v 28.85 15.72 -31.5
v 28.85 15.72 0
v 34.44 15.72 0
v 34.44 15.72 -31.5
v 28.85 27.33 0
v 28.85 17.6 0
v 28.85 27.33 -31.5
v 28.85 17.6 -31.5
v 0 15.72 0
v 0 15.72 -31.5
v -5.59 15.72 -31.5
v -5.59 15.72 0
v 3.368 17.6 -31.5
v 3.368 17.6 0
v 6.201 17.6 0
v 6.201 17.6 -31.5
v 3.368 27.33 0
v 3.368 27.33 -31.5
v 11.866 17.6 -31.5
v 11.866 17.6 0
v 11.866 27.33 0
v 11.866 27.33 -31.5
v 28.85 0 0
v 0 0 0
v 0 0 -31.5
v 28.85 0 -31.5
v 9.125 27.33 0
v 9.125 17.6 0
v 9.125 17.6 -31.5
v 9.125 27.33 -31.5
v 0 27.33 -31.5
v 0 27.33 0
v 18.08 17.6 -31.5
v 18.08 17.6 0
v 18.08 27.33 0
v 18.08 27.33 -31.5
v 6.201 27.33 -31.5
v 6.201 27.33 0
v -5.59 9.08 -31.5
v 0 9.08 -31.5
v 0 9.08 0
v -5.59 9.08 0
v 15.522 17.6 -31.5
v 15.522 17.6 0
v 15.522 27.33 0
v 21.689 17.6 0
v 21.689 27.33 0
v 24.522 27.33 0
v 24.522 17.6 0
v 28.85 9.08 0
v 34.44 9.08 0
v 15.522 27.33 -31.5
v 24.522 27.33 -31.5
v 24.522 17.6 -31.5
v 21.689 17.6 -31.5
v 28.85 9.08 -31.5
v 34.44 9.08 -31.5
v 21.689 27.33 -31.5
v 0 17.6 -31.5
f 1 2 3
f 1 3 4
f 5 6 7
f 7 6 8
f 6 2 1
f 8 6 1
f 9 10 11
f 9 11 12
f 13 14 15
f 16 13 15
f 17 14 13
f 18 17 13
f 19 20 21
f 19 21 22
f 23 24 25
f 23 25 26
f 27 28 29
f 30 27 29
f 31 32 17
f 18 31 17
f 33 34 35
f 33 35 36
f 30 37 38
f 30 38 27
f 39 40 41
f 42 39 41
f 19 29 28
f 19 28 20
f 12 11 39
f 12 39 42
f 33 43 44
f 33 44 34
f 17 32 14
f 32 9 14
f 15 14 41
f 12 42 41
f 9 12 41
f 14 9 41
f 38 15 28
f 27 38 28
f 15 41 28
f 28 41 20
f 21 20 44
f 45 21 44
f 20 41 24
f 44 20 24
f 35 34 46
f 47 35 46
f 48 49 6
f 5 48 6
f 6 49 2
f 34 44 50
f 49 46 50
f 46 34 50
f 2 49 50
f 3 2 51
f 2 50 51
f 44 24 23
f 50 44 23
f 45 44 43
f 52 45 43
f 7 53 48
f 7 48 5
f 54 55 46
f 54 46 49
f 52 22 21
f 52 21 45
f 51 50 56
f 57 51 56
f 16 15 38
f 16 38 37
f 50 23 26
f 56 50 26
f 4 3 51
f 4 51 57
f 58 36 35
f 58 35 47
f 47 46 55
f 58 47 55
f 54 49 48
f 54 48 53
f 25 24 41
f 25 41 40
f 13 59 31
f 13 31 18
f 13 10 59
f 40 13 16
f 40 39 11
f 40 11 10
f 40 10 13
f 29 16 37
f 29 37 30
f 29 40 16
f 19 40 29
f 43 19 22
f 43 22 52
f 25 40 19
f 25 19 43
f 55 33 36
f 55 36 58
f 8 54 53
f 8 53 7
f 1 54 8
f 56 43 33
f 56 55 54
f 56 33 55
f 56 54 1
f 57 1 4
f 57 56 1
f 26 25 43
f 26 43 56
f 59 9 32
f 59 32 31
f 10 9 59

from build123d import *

# Parameters (mm, degrees)
CROQUIS1_W              = 28.85
CROQUIS1_H              = 31.5
SALIENTE_EXTRUIR1_DEPTH = 17.6
CROQUIS3_W              = 3.368460879
CROQUIS3_H              = 31.5
CROQUIS3_W_2            = 4.327912621
CROQUIS3_W_3            = 3.609366076
CROQUIS3_W_4            = 3.655054254
CROQUIS3_W_5            = 2.924043404
SALIENTE_EXTRUIR2_DEPTH = 9.73
CROQUIS4_W              = 31.5
CROQUIS4_H              = 6.64
SALIENTE_EXTRUIR3_DEPTH = 5.59
CROQUIS5_W              = 31.5
CROQUIS5_H              = 6.64
SALIENTE_EXTRUIR4_DEPTH = 5.59


with BuildPart() as part:
    # Croquis1 → Saliente-Extruir1 (new body)
    with BuildSketch(Plane(origin=(0, 0, 0), x_dir=(1, 0, 0), z_dir=(0, 1, 0))):
        with Locations((14.425, 15.75)):
            Rectangle(CROQUIS1_W, CROQUIS1_H)
    extrude(amount=SALIENTE_EXTRUIR1_DEPTH)

    # Croquis3 → Saliente-Extruir2 (add)
    with BuildSketch(Plane(origin=(0, 17.6, 0), x_dir=(1, 0, 0), z_dir=(0, 1, 0))):
        with Locations((1.68423044, 15.75)):
            Rectangle(CROQUIS3_W, CROQUIS3_H)
        with Locations((26.68604369, 15.75)):
            Rectangle(CROQUIS3_W_2, CROQUIS3_H)
        with Locations((19.884737293, 15.75)):
            Rectangle(CROQUIS3_W_3, CROQUIS3_H)
        with Locations((13.693989149, 15.75)):
            Rectangle(CROQUIS3_W_4, CROQUIS3_H)
        with Locations((7.663149629, 15.75)):
            Rectangle(CROQUIS3_W_5, CROQUIS3_H)
    extrude(amount=SALIENTE_EXTRUIR2_DEPTH)

    # Croquis4 → Saliente-Extruir3 (add)
    with BuildSketch(Plane.ZY):
        with Locations((-15.75, 12.4)):
            Rectangle(CROQUIS4_W, CROQUIS4_H)
    extrude(amount=SALIENTE_EXTRUIR3_DEPTH)

    # Croquis5 → Saliente-Extruir4 (add)
    with BuildSketch(Plane(origin=(28.85, 0, 0), x_dir=(0, 0, -1), z_dir=(1, 0, 0))):
        with Locations((15.75, 12.4)):
            Rectangle(CROQUIS5_W, CROQUIS5_H)
    extrude(amount=SALIENTE_EXTRUIR4_DEPTH)


solid = part.part
